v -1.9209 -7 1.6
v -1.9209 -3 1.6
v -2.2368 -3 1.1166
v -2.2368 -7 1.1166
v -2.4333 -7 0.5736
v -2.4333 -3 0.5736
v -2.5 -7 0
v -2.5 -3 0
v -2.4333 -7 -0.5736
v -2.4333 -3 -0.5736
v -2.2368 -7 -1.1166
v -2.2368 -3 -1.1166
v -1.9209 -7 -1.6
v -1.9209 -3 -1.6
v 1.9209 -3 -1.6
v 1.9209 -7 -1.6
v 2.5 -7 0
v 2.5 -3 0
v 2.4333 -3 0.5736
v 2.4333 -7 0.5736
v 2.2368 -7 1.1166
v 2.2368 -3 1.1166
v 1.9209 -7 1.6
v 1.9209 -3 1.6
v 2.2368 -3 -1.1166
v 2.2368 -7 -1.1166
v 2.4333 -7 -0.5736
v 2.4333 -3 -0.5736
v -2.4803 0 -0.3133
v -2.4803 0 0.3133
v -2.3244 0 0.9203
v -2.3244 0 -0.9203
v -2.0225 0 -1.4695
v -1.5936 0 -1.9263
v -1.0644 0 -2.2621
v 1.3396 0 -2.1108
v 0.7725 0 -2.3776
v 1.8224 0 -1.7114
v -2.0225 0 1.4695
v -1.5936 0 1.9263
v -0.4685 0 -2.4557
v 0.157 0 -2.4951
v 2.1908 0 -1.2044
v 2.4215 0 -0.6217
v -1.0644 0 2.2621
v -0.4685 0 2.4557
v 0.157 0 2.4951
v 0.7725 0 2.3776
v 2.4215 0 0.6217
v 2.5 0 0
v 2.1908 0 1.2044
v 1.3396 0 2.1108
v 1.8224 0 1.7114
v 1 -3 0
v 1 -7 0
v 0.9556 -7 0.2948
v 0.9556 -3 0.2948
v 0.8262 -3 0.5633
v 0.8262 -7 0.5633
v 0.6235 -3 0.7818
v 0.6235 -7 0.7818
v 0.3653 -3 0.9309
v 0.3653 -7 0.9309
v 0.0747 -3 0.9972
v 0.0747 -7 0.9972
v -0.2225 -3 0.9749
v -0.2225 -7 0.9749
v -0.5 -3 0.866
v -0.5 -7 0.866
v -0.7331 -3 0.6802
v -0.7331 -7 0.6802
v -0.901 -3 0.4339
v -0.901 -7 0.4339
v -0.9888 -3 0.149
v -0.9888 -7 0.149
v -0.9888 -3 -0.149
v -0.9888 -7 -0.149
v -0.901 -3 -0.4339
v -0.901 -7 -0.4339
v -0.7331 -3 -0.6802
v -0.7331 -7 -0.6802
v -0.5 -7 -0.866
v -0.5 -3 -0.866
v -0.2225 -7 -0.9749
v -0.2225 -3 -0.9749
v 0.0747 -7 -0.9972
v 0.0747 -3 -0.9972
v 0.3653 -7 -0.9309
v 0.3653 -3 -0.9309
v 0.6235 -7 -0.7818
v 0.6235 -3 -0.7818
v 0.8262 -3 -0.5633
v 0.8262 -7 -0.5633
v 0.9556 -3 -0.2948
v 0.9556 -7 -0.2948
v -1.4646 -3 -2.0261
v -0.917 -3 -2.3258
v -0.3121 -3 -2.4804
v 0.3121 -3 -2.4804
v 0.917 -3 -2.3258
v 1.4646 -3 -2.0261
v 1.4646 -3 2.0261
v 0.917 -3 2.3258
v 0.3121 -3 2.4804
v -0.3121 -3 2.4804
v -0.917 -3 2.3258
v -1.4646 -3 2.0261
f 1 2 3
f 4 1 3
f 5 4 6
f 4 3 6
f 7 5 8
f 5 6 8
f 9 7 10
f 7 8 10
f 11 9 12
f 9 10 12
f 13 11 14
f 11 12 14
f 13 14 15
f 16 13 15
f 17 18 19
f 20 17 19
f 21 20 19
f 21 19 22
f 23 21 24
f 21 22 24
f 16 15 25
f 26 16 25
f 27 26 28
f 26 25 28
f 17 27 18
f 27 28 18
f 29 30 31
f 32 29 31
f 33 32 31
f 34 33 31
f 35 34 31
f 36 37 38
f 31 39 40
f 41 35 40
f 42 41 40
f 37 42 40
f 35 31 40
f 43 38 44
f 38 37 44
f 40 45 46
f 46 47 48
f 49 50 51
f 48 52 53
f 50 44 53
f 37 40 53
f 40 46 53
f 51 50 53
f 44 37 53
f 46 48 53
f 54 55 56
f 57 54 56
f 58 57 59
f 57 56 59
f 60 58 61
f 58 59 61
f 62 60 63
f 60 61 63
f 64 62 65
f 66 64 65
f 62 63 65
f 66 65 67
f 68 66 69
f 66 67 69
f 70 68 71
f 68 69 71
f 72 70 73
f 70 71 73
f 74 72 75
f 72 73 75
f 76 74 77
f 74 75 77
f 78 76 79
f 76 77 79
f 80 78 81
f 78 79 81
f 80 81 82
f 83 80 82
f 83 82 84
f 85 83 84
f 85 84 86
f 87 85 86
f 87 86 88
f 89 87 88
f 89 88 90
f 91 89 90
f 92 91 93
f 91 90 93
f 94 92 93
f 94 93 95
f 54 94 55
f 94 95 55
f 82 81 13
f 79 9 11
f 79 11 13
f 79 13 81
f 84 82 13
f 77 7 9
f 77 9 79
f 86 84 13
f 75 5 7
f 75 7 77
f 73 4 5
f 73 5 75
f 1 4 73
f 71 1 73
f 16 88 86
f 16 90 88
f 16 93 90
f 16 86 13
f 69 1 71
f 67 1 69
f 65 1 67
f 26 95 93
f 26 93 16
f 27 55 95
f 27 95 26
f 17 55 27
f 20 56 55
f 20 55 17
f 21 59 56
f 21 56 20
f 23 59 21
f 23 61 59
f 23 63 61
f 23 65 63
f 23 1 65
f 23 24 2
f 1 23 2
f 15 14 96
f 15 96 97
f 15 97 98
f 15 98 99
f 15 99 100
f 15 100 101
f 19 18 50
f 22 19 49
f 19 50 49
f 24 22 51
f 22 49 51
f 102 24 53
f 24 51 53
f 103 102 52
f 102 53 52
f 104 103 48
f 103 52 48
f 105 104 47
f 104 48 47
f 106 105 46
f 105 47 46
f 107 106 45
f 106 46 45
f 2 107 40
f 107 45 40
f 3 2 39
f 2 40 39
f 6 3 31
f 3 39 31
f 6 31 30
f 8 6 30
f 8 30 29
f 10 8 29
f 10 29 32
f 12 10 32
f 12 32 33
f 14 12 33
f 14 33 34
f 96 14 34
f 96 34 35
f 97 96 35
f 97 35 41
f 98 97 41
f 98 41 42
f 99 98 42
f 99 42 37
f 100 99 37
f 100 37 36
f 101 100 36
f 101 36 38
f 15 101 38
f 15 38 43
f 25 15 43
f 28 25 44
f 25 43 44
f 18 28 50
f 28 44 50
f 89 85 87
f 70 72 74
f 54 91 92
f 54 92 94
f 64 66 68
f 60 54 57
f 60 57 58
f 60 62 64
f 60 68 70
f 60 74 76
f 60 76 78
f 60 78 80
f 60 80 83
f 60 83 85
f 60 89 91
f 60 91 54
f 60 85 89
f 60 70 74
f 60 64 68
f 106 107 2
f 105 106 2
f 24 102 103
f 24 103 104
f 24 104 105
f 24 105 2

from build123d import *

# Parameters (mm, degrees)
F0_R     = 2.5
F1_DEPTH = 3
F3_DEPTH = 4
F4_R     = 1
F5_DEPTH = 4


with BuildPart() as f1:
    # F0 (on Front) → F1 (new body)
    with BuildSketch(Plane.XZ):
        Circle(F0_R)
    extrude(amount=F1_DEPTH)

    # F2 (on face) → F3 (join)
    with BuildSketch(Plane.XZ.offset(3)):
        with BuildLine():
            Line((1.920937, 1.6), (-1.920937, 1.6))
            ThreePointArc((-1.920937, 1.6), (-2.5, 0), (-1.920937, -1.6))
            Line((-1.920937, -1.6), (1.920937, -1.6))
            ThreePointArc((1.920937, -1.6), (2.350781, -0.850781), (2.5, 0))
            ThreePointArc((2.5, 0), (2.350781, 0.850781), (1.920937, 1.6))
        make_face()
    extrude(amount=F3_DEPTH)

    # F4 (on face) → F5 (cut)
    with BuildSketch(Plane.XZ.offset(7)):
        Circle(F4_R)
    extrude(amount=-F5_DEPTH, mode=Mode.SUBTRACT)


solid = f1.part
